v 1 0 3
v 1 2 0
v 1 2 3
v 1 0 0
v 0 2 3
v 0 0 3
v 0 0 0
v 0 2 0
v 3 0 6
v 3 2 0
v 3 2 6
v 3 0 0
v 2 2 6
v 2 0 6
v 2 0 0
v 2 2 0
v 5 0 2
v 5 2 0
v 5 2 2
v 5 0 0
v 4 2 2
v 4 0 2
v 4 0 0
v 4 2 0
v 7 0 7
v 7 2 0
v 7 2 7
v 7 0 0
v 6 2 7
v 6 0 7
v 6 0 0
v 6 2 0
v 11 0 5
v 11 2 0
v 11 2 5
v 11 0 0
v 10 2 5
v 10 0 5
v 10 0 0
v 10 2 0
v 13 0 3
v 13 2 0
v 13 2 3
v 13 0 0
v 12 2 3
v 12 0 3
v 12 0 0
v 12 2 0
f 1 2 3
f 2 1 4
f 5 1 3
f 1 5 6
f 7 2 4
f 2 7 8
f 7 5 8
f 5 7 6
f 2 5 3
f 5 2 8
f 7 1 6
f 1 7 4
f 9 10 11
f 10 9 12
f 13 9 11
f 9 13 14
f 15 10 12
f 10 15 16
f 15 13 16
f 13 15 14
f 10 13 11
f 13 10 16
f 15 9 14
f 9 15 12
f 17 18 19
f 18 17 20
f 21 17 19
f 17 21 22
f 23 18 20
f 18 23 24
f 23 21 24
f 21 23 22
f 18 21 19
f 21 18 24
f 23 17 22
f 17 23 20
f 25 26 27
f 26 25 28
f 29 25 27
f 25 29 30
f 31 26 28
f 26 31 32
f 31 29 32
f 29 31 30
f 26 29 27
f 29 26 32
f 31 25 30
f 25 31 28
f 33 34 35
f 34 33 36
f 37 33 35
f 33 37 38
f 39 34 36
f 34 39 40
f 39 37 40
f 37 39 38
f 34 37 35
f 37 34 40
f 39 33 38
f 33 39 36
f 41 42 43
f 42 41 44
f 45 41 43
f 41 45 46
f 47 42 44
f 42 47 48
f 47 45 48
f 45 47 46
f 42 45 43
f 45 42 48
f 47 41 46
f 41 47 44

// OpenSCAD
union() {
  translate([0, 0, 0]) cube(size=[1,2,3], center=false);
  translate([2, 0, 0]) cube(size=[1,2,6], center=false);
  translate([4, 0, 0]) cube(size=[1,2,2], center=false);
  translate([6, 0, 0]) cube(size=[1,2,7], center=false);
  translate([10, 0, 0]) cube(size=[1,2,5], center=false);
  translate([12, 0, 0]) cube(size=[1,2,3], center=false);
}
